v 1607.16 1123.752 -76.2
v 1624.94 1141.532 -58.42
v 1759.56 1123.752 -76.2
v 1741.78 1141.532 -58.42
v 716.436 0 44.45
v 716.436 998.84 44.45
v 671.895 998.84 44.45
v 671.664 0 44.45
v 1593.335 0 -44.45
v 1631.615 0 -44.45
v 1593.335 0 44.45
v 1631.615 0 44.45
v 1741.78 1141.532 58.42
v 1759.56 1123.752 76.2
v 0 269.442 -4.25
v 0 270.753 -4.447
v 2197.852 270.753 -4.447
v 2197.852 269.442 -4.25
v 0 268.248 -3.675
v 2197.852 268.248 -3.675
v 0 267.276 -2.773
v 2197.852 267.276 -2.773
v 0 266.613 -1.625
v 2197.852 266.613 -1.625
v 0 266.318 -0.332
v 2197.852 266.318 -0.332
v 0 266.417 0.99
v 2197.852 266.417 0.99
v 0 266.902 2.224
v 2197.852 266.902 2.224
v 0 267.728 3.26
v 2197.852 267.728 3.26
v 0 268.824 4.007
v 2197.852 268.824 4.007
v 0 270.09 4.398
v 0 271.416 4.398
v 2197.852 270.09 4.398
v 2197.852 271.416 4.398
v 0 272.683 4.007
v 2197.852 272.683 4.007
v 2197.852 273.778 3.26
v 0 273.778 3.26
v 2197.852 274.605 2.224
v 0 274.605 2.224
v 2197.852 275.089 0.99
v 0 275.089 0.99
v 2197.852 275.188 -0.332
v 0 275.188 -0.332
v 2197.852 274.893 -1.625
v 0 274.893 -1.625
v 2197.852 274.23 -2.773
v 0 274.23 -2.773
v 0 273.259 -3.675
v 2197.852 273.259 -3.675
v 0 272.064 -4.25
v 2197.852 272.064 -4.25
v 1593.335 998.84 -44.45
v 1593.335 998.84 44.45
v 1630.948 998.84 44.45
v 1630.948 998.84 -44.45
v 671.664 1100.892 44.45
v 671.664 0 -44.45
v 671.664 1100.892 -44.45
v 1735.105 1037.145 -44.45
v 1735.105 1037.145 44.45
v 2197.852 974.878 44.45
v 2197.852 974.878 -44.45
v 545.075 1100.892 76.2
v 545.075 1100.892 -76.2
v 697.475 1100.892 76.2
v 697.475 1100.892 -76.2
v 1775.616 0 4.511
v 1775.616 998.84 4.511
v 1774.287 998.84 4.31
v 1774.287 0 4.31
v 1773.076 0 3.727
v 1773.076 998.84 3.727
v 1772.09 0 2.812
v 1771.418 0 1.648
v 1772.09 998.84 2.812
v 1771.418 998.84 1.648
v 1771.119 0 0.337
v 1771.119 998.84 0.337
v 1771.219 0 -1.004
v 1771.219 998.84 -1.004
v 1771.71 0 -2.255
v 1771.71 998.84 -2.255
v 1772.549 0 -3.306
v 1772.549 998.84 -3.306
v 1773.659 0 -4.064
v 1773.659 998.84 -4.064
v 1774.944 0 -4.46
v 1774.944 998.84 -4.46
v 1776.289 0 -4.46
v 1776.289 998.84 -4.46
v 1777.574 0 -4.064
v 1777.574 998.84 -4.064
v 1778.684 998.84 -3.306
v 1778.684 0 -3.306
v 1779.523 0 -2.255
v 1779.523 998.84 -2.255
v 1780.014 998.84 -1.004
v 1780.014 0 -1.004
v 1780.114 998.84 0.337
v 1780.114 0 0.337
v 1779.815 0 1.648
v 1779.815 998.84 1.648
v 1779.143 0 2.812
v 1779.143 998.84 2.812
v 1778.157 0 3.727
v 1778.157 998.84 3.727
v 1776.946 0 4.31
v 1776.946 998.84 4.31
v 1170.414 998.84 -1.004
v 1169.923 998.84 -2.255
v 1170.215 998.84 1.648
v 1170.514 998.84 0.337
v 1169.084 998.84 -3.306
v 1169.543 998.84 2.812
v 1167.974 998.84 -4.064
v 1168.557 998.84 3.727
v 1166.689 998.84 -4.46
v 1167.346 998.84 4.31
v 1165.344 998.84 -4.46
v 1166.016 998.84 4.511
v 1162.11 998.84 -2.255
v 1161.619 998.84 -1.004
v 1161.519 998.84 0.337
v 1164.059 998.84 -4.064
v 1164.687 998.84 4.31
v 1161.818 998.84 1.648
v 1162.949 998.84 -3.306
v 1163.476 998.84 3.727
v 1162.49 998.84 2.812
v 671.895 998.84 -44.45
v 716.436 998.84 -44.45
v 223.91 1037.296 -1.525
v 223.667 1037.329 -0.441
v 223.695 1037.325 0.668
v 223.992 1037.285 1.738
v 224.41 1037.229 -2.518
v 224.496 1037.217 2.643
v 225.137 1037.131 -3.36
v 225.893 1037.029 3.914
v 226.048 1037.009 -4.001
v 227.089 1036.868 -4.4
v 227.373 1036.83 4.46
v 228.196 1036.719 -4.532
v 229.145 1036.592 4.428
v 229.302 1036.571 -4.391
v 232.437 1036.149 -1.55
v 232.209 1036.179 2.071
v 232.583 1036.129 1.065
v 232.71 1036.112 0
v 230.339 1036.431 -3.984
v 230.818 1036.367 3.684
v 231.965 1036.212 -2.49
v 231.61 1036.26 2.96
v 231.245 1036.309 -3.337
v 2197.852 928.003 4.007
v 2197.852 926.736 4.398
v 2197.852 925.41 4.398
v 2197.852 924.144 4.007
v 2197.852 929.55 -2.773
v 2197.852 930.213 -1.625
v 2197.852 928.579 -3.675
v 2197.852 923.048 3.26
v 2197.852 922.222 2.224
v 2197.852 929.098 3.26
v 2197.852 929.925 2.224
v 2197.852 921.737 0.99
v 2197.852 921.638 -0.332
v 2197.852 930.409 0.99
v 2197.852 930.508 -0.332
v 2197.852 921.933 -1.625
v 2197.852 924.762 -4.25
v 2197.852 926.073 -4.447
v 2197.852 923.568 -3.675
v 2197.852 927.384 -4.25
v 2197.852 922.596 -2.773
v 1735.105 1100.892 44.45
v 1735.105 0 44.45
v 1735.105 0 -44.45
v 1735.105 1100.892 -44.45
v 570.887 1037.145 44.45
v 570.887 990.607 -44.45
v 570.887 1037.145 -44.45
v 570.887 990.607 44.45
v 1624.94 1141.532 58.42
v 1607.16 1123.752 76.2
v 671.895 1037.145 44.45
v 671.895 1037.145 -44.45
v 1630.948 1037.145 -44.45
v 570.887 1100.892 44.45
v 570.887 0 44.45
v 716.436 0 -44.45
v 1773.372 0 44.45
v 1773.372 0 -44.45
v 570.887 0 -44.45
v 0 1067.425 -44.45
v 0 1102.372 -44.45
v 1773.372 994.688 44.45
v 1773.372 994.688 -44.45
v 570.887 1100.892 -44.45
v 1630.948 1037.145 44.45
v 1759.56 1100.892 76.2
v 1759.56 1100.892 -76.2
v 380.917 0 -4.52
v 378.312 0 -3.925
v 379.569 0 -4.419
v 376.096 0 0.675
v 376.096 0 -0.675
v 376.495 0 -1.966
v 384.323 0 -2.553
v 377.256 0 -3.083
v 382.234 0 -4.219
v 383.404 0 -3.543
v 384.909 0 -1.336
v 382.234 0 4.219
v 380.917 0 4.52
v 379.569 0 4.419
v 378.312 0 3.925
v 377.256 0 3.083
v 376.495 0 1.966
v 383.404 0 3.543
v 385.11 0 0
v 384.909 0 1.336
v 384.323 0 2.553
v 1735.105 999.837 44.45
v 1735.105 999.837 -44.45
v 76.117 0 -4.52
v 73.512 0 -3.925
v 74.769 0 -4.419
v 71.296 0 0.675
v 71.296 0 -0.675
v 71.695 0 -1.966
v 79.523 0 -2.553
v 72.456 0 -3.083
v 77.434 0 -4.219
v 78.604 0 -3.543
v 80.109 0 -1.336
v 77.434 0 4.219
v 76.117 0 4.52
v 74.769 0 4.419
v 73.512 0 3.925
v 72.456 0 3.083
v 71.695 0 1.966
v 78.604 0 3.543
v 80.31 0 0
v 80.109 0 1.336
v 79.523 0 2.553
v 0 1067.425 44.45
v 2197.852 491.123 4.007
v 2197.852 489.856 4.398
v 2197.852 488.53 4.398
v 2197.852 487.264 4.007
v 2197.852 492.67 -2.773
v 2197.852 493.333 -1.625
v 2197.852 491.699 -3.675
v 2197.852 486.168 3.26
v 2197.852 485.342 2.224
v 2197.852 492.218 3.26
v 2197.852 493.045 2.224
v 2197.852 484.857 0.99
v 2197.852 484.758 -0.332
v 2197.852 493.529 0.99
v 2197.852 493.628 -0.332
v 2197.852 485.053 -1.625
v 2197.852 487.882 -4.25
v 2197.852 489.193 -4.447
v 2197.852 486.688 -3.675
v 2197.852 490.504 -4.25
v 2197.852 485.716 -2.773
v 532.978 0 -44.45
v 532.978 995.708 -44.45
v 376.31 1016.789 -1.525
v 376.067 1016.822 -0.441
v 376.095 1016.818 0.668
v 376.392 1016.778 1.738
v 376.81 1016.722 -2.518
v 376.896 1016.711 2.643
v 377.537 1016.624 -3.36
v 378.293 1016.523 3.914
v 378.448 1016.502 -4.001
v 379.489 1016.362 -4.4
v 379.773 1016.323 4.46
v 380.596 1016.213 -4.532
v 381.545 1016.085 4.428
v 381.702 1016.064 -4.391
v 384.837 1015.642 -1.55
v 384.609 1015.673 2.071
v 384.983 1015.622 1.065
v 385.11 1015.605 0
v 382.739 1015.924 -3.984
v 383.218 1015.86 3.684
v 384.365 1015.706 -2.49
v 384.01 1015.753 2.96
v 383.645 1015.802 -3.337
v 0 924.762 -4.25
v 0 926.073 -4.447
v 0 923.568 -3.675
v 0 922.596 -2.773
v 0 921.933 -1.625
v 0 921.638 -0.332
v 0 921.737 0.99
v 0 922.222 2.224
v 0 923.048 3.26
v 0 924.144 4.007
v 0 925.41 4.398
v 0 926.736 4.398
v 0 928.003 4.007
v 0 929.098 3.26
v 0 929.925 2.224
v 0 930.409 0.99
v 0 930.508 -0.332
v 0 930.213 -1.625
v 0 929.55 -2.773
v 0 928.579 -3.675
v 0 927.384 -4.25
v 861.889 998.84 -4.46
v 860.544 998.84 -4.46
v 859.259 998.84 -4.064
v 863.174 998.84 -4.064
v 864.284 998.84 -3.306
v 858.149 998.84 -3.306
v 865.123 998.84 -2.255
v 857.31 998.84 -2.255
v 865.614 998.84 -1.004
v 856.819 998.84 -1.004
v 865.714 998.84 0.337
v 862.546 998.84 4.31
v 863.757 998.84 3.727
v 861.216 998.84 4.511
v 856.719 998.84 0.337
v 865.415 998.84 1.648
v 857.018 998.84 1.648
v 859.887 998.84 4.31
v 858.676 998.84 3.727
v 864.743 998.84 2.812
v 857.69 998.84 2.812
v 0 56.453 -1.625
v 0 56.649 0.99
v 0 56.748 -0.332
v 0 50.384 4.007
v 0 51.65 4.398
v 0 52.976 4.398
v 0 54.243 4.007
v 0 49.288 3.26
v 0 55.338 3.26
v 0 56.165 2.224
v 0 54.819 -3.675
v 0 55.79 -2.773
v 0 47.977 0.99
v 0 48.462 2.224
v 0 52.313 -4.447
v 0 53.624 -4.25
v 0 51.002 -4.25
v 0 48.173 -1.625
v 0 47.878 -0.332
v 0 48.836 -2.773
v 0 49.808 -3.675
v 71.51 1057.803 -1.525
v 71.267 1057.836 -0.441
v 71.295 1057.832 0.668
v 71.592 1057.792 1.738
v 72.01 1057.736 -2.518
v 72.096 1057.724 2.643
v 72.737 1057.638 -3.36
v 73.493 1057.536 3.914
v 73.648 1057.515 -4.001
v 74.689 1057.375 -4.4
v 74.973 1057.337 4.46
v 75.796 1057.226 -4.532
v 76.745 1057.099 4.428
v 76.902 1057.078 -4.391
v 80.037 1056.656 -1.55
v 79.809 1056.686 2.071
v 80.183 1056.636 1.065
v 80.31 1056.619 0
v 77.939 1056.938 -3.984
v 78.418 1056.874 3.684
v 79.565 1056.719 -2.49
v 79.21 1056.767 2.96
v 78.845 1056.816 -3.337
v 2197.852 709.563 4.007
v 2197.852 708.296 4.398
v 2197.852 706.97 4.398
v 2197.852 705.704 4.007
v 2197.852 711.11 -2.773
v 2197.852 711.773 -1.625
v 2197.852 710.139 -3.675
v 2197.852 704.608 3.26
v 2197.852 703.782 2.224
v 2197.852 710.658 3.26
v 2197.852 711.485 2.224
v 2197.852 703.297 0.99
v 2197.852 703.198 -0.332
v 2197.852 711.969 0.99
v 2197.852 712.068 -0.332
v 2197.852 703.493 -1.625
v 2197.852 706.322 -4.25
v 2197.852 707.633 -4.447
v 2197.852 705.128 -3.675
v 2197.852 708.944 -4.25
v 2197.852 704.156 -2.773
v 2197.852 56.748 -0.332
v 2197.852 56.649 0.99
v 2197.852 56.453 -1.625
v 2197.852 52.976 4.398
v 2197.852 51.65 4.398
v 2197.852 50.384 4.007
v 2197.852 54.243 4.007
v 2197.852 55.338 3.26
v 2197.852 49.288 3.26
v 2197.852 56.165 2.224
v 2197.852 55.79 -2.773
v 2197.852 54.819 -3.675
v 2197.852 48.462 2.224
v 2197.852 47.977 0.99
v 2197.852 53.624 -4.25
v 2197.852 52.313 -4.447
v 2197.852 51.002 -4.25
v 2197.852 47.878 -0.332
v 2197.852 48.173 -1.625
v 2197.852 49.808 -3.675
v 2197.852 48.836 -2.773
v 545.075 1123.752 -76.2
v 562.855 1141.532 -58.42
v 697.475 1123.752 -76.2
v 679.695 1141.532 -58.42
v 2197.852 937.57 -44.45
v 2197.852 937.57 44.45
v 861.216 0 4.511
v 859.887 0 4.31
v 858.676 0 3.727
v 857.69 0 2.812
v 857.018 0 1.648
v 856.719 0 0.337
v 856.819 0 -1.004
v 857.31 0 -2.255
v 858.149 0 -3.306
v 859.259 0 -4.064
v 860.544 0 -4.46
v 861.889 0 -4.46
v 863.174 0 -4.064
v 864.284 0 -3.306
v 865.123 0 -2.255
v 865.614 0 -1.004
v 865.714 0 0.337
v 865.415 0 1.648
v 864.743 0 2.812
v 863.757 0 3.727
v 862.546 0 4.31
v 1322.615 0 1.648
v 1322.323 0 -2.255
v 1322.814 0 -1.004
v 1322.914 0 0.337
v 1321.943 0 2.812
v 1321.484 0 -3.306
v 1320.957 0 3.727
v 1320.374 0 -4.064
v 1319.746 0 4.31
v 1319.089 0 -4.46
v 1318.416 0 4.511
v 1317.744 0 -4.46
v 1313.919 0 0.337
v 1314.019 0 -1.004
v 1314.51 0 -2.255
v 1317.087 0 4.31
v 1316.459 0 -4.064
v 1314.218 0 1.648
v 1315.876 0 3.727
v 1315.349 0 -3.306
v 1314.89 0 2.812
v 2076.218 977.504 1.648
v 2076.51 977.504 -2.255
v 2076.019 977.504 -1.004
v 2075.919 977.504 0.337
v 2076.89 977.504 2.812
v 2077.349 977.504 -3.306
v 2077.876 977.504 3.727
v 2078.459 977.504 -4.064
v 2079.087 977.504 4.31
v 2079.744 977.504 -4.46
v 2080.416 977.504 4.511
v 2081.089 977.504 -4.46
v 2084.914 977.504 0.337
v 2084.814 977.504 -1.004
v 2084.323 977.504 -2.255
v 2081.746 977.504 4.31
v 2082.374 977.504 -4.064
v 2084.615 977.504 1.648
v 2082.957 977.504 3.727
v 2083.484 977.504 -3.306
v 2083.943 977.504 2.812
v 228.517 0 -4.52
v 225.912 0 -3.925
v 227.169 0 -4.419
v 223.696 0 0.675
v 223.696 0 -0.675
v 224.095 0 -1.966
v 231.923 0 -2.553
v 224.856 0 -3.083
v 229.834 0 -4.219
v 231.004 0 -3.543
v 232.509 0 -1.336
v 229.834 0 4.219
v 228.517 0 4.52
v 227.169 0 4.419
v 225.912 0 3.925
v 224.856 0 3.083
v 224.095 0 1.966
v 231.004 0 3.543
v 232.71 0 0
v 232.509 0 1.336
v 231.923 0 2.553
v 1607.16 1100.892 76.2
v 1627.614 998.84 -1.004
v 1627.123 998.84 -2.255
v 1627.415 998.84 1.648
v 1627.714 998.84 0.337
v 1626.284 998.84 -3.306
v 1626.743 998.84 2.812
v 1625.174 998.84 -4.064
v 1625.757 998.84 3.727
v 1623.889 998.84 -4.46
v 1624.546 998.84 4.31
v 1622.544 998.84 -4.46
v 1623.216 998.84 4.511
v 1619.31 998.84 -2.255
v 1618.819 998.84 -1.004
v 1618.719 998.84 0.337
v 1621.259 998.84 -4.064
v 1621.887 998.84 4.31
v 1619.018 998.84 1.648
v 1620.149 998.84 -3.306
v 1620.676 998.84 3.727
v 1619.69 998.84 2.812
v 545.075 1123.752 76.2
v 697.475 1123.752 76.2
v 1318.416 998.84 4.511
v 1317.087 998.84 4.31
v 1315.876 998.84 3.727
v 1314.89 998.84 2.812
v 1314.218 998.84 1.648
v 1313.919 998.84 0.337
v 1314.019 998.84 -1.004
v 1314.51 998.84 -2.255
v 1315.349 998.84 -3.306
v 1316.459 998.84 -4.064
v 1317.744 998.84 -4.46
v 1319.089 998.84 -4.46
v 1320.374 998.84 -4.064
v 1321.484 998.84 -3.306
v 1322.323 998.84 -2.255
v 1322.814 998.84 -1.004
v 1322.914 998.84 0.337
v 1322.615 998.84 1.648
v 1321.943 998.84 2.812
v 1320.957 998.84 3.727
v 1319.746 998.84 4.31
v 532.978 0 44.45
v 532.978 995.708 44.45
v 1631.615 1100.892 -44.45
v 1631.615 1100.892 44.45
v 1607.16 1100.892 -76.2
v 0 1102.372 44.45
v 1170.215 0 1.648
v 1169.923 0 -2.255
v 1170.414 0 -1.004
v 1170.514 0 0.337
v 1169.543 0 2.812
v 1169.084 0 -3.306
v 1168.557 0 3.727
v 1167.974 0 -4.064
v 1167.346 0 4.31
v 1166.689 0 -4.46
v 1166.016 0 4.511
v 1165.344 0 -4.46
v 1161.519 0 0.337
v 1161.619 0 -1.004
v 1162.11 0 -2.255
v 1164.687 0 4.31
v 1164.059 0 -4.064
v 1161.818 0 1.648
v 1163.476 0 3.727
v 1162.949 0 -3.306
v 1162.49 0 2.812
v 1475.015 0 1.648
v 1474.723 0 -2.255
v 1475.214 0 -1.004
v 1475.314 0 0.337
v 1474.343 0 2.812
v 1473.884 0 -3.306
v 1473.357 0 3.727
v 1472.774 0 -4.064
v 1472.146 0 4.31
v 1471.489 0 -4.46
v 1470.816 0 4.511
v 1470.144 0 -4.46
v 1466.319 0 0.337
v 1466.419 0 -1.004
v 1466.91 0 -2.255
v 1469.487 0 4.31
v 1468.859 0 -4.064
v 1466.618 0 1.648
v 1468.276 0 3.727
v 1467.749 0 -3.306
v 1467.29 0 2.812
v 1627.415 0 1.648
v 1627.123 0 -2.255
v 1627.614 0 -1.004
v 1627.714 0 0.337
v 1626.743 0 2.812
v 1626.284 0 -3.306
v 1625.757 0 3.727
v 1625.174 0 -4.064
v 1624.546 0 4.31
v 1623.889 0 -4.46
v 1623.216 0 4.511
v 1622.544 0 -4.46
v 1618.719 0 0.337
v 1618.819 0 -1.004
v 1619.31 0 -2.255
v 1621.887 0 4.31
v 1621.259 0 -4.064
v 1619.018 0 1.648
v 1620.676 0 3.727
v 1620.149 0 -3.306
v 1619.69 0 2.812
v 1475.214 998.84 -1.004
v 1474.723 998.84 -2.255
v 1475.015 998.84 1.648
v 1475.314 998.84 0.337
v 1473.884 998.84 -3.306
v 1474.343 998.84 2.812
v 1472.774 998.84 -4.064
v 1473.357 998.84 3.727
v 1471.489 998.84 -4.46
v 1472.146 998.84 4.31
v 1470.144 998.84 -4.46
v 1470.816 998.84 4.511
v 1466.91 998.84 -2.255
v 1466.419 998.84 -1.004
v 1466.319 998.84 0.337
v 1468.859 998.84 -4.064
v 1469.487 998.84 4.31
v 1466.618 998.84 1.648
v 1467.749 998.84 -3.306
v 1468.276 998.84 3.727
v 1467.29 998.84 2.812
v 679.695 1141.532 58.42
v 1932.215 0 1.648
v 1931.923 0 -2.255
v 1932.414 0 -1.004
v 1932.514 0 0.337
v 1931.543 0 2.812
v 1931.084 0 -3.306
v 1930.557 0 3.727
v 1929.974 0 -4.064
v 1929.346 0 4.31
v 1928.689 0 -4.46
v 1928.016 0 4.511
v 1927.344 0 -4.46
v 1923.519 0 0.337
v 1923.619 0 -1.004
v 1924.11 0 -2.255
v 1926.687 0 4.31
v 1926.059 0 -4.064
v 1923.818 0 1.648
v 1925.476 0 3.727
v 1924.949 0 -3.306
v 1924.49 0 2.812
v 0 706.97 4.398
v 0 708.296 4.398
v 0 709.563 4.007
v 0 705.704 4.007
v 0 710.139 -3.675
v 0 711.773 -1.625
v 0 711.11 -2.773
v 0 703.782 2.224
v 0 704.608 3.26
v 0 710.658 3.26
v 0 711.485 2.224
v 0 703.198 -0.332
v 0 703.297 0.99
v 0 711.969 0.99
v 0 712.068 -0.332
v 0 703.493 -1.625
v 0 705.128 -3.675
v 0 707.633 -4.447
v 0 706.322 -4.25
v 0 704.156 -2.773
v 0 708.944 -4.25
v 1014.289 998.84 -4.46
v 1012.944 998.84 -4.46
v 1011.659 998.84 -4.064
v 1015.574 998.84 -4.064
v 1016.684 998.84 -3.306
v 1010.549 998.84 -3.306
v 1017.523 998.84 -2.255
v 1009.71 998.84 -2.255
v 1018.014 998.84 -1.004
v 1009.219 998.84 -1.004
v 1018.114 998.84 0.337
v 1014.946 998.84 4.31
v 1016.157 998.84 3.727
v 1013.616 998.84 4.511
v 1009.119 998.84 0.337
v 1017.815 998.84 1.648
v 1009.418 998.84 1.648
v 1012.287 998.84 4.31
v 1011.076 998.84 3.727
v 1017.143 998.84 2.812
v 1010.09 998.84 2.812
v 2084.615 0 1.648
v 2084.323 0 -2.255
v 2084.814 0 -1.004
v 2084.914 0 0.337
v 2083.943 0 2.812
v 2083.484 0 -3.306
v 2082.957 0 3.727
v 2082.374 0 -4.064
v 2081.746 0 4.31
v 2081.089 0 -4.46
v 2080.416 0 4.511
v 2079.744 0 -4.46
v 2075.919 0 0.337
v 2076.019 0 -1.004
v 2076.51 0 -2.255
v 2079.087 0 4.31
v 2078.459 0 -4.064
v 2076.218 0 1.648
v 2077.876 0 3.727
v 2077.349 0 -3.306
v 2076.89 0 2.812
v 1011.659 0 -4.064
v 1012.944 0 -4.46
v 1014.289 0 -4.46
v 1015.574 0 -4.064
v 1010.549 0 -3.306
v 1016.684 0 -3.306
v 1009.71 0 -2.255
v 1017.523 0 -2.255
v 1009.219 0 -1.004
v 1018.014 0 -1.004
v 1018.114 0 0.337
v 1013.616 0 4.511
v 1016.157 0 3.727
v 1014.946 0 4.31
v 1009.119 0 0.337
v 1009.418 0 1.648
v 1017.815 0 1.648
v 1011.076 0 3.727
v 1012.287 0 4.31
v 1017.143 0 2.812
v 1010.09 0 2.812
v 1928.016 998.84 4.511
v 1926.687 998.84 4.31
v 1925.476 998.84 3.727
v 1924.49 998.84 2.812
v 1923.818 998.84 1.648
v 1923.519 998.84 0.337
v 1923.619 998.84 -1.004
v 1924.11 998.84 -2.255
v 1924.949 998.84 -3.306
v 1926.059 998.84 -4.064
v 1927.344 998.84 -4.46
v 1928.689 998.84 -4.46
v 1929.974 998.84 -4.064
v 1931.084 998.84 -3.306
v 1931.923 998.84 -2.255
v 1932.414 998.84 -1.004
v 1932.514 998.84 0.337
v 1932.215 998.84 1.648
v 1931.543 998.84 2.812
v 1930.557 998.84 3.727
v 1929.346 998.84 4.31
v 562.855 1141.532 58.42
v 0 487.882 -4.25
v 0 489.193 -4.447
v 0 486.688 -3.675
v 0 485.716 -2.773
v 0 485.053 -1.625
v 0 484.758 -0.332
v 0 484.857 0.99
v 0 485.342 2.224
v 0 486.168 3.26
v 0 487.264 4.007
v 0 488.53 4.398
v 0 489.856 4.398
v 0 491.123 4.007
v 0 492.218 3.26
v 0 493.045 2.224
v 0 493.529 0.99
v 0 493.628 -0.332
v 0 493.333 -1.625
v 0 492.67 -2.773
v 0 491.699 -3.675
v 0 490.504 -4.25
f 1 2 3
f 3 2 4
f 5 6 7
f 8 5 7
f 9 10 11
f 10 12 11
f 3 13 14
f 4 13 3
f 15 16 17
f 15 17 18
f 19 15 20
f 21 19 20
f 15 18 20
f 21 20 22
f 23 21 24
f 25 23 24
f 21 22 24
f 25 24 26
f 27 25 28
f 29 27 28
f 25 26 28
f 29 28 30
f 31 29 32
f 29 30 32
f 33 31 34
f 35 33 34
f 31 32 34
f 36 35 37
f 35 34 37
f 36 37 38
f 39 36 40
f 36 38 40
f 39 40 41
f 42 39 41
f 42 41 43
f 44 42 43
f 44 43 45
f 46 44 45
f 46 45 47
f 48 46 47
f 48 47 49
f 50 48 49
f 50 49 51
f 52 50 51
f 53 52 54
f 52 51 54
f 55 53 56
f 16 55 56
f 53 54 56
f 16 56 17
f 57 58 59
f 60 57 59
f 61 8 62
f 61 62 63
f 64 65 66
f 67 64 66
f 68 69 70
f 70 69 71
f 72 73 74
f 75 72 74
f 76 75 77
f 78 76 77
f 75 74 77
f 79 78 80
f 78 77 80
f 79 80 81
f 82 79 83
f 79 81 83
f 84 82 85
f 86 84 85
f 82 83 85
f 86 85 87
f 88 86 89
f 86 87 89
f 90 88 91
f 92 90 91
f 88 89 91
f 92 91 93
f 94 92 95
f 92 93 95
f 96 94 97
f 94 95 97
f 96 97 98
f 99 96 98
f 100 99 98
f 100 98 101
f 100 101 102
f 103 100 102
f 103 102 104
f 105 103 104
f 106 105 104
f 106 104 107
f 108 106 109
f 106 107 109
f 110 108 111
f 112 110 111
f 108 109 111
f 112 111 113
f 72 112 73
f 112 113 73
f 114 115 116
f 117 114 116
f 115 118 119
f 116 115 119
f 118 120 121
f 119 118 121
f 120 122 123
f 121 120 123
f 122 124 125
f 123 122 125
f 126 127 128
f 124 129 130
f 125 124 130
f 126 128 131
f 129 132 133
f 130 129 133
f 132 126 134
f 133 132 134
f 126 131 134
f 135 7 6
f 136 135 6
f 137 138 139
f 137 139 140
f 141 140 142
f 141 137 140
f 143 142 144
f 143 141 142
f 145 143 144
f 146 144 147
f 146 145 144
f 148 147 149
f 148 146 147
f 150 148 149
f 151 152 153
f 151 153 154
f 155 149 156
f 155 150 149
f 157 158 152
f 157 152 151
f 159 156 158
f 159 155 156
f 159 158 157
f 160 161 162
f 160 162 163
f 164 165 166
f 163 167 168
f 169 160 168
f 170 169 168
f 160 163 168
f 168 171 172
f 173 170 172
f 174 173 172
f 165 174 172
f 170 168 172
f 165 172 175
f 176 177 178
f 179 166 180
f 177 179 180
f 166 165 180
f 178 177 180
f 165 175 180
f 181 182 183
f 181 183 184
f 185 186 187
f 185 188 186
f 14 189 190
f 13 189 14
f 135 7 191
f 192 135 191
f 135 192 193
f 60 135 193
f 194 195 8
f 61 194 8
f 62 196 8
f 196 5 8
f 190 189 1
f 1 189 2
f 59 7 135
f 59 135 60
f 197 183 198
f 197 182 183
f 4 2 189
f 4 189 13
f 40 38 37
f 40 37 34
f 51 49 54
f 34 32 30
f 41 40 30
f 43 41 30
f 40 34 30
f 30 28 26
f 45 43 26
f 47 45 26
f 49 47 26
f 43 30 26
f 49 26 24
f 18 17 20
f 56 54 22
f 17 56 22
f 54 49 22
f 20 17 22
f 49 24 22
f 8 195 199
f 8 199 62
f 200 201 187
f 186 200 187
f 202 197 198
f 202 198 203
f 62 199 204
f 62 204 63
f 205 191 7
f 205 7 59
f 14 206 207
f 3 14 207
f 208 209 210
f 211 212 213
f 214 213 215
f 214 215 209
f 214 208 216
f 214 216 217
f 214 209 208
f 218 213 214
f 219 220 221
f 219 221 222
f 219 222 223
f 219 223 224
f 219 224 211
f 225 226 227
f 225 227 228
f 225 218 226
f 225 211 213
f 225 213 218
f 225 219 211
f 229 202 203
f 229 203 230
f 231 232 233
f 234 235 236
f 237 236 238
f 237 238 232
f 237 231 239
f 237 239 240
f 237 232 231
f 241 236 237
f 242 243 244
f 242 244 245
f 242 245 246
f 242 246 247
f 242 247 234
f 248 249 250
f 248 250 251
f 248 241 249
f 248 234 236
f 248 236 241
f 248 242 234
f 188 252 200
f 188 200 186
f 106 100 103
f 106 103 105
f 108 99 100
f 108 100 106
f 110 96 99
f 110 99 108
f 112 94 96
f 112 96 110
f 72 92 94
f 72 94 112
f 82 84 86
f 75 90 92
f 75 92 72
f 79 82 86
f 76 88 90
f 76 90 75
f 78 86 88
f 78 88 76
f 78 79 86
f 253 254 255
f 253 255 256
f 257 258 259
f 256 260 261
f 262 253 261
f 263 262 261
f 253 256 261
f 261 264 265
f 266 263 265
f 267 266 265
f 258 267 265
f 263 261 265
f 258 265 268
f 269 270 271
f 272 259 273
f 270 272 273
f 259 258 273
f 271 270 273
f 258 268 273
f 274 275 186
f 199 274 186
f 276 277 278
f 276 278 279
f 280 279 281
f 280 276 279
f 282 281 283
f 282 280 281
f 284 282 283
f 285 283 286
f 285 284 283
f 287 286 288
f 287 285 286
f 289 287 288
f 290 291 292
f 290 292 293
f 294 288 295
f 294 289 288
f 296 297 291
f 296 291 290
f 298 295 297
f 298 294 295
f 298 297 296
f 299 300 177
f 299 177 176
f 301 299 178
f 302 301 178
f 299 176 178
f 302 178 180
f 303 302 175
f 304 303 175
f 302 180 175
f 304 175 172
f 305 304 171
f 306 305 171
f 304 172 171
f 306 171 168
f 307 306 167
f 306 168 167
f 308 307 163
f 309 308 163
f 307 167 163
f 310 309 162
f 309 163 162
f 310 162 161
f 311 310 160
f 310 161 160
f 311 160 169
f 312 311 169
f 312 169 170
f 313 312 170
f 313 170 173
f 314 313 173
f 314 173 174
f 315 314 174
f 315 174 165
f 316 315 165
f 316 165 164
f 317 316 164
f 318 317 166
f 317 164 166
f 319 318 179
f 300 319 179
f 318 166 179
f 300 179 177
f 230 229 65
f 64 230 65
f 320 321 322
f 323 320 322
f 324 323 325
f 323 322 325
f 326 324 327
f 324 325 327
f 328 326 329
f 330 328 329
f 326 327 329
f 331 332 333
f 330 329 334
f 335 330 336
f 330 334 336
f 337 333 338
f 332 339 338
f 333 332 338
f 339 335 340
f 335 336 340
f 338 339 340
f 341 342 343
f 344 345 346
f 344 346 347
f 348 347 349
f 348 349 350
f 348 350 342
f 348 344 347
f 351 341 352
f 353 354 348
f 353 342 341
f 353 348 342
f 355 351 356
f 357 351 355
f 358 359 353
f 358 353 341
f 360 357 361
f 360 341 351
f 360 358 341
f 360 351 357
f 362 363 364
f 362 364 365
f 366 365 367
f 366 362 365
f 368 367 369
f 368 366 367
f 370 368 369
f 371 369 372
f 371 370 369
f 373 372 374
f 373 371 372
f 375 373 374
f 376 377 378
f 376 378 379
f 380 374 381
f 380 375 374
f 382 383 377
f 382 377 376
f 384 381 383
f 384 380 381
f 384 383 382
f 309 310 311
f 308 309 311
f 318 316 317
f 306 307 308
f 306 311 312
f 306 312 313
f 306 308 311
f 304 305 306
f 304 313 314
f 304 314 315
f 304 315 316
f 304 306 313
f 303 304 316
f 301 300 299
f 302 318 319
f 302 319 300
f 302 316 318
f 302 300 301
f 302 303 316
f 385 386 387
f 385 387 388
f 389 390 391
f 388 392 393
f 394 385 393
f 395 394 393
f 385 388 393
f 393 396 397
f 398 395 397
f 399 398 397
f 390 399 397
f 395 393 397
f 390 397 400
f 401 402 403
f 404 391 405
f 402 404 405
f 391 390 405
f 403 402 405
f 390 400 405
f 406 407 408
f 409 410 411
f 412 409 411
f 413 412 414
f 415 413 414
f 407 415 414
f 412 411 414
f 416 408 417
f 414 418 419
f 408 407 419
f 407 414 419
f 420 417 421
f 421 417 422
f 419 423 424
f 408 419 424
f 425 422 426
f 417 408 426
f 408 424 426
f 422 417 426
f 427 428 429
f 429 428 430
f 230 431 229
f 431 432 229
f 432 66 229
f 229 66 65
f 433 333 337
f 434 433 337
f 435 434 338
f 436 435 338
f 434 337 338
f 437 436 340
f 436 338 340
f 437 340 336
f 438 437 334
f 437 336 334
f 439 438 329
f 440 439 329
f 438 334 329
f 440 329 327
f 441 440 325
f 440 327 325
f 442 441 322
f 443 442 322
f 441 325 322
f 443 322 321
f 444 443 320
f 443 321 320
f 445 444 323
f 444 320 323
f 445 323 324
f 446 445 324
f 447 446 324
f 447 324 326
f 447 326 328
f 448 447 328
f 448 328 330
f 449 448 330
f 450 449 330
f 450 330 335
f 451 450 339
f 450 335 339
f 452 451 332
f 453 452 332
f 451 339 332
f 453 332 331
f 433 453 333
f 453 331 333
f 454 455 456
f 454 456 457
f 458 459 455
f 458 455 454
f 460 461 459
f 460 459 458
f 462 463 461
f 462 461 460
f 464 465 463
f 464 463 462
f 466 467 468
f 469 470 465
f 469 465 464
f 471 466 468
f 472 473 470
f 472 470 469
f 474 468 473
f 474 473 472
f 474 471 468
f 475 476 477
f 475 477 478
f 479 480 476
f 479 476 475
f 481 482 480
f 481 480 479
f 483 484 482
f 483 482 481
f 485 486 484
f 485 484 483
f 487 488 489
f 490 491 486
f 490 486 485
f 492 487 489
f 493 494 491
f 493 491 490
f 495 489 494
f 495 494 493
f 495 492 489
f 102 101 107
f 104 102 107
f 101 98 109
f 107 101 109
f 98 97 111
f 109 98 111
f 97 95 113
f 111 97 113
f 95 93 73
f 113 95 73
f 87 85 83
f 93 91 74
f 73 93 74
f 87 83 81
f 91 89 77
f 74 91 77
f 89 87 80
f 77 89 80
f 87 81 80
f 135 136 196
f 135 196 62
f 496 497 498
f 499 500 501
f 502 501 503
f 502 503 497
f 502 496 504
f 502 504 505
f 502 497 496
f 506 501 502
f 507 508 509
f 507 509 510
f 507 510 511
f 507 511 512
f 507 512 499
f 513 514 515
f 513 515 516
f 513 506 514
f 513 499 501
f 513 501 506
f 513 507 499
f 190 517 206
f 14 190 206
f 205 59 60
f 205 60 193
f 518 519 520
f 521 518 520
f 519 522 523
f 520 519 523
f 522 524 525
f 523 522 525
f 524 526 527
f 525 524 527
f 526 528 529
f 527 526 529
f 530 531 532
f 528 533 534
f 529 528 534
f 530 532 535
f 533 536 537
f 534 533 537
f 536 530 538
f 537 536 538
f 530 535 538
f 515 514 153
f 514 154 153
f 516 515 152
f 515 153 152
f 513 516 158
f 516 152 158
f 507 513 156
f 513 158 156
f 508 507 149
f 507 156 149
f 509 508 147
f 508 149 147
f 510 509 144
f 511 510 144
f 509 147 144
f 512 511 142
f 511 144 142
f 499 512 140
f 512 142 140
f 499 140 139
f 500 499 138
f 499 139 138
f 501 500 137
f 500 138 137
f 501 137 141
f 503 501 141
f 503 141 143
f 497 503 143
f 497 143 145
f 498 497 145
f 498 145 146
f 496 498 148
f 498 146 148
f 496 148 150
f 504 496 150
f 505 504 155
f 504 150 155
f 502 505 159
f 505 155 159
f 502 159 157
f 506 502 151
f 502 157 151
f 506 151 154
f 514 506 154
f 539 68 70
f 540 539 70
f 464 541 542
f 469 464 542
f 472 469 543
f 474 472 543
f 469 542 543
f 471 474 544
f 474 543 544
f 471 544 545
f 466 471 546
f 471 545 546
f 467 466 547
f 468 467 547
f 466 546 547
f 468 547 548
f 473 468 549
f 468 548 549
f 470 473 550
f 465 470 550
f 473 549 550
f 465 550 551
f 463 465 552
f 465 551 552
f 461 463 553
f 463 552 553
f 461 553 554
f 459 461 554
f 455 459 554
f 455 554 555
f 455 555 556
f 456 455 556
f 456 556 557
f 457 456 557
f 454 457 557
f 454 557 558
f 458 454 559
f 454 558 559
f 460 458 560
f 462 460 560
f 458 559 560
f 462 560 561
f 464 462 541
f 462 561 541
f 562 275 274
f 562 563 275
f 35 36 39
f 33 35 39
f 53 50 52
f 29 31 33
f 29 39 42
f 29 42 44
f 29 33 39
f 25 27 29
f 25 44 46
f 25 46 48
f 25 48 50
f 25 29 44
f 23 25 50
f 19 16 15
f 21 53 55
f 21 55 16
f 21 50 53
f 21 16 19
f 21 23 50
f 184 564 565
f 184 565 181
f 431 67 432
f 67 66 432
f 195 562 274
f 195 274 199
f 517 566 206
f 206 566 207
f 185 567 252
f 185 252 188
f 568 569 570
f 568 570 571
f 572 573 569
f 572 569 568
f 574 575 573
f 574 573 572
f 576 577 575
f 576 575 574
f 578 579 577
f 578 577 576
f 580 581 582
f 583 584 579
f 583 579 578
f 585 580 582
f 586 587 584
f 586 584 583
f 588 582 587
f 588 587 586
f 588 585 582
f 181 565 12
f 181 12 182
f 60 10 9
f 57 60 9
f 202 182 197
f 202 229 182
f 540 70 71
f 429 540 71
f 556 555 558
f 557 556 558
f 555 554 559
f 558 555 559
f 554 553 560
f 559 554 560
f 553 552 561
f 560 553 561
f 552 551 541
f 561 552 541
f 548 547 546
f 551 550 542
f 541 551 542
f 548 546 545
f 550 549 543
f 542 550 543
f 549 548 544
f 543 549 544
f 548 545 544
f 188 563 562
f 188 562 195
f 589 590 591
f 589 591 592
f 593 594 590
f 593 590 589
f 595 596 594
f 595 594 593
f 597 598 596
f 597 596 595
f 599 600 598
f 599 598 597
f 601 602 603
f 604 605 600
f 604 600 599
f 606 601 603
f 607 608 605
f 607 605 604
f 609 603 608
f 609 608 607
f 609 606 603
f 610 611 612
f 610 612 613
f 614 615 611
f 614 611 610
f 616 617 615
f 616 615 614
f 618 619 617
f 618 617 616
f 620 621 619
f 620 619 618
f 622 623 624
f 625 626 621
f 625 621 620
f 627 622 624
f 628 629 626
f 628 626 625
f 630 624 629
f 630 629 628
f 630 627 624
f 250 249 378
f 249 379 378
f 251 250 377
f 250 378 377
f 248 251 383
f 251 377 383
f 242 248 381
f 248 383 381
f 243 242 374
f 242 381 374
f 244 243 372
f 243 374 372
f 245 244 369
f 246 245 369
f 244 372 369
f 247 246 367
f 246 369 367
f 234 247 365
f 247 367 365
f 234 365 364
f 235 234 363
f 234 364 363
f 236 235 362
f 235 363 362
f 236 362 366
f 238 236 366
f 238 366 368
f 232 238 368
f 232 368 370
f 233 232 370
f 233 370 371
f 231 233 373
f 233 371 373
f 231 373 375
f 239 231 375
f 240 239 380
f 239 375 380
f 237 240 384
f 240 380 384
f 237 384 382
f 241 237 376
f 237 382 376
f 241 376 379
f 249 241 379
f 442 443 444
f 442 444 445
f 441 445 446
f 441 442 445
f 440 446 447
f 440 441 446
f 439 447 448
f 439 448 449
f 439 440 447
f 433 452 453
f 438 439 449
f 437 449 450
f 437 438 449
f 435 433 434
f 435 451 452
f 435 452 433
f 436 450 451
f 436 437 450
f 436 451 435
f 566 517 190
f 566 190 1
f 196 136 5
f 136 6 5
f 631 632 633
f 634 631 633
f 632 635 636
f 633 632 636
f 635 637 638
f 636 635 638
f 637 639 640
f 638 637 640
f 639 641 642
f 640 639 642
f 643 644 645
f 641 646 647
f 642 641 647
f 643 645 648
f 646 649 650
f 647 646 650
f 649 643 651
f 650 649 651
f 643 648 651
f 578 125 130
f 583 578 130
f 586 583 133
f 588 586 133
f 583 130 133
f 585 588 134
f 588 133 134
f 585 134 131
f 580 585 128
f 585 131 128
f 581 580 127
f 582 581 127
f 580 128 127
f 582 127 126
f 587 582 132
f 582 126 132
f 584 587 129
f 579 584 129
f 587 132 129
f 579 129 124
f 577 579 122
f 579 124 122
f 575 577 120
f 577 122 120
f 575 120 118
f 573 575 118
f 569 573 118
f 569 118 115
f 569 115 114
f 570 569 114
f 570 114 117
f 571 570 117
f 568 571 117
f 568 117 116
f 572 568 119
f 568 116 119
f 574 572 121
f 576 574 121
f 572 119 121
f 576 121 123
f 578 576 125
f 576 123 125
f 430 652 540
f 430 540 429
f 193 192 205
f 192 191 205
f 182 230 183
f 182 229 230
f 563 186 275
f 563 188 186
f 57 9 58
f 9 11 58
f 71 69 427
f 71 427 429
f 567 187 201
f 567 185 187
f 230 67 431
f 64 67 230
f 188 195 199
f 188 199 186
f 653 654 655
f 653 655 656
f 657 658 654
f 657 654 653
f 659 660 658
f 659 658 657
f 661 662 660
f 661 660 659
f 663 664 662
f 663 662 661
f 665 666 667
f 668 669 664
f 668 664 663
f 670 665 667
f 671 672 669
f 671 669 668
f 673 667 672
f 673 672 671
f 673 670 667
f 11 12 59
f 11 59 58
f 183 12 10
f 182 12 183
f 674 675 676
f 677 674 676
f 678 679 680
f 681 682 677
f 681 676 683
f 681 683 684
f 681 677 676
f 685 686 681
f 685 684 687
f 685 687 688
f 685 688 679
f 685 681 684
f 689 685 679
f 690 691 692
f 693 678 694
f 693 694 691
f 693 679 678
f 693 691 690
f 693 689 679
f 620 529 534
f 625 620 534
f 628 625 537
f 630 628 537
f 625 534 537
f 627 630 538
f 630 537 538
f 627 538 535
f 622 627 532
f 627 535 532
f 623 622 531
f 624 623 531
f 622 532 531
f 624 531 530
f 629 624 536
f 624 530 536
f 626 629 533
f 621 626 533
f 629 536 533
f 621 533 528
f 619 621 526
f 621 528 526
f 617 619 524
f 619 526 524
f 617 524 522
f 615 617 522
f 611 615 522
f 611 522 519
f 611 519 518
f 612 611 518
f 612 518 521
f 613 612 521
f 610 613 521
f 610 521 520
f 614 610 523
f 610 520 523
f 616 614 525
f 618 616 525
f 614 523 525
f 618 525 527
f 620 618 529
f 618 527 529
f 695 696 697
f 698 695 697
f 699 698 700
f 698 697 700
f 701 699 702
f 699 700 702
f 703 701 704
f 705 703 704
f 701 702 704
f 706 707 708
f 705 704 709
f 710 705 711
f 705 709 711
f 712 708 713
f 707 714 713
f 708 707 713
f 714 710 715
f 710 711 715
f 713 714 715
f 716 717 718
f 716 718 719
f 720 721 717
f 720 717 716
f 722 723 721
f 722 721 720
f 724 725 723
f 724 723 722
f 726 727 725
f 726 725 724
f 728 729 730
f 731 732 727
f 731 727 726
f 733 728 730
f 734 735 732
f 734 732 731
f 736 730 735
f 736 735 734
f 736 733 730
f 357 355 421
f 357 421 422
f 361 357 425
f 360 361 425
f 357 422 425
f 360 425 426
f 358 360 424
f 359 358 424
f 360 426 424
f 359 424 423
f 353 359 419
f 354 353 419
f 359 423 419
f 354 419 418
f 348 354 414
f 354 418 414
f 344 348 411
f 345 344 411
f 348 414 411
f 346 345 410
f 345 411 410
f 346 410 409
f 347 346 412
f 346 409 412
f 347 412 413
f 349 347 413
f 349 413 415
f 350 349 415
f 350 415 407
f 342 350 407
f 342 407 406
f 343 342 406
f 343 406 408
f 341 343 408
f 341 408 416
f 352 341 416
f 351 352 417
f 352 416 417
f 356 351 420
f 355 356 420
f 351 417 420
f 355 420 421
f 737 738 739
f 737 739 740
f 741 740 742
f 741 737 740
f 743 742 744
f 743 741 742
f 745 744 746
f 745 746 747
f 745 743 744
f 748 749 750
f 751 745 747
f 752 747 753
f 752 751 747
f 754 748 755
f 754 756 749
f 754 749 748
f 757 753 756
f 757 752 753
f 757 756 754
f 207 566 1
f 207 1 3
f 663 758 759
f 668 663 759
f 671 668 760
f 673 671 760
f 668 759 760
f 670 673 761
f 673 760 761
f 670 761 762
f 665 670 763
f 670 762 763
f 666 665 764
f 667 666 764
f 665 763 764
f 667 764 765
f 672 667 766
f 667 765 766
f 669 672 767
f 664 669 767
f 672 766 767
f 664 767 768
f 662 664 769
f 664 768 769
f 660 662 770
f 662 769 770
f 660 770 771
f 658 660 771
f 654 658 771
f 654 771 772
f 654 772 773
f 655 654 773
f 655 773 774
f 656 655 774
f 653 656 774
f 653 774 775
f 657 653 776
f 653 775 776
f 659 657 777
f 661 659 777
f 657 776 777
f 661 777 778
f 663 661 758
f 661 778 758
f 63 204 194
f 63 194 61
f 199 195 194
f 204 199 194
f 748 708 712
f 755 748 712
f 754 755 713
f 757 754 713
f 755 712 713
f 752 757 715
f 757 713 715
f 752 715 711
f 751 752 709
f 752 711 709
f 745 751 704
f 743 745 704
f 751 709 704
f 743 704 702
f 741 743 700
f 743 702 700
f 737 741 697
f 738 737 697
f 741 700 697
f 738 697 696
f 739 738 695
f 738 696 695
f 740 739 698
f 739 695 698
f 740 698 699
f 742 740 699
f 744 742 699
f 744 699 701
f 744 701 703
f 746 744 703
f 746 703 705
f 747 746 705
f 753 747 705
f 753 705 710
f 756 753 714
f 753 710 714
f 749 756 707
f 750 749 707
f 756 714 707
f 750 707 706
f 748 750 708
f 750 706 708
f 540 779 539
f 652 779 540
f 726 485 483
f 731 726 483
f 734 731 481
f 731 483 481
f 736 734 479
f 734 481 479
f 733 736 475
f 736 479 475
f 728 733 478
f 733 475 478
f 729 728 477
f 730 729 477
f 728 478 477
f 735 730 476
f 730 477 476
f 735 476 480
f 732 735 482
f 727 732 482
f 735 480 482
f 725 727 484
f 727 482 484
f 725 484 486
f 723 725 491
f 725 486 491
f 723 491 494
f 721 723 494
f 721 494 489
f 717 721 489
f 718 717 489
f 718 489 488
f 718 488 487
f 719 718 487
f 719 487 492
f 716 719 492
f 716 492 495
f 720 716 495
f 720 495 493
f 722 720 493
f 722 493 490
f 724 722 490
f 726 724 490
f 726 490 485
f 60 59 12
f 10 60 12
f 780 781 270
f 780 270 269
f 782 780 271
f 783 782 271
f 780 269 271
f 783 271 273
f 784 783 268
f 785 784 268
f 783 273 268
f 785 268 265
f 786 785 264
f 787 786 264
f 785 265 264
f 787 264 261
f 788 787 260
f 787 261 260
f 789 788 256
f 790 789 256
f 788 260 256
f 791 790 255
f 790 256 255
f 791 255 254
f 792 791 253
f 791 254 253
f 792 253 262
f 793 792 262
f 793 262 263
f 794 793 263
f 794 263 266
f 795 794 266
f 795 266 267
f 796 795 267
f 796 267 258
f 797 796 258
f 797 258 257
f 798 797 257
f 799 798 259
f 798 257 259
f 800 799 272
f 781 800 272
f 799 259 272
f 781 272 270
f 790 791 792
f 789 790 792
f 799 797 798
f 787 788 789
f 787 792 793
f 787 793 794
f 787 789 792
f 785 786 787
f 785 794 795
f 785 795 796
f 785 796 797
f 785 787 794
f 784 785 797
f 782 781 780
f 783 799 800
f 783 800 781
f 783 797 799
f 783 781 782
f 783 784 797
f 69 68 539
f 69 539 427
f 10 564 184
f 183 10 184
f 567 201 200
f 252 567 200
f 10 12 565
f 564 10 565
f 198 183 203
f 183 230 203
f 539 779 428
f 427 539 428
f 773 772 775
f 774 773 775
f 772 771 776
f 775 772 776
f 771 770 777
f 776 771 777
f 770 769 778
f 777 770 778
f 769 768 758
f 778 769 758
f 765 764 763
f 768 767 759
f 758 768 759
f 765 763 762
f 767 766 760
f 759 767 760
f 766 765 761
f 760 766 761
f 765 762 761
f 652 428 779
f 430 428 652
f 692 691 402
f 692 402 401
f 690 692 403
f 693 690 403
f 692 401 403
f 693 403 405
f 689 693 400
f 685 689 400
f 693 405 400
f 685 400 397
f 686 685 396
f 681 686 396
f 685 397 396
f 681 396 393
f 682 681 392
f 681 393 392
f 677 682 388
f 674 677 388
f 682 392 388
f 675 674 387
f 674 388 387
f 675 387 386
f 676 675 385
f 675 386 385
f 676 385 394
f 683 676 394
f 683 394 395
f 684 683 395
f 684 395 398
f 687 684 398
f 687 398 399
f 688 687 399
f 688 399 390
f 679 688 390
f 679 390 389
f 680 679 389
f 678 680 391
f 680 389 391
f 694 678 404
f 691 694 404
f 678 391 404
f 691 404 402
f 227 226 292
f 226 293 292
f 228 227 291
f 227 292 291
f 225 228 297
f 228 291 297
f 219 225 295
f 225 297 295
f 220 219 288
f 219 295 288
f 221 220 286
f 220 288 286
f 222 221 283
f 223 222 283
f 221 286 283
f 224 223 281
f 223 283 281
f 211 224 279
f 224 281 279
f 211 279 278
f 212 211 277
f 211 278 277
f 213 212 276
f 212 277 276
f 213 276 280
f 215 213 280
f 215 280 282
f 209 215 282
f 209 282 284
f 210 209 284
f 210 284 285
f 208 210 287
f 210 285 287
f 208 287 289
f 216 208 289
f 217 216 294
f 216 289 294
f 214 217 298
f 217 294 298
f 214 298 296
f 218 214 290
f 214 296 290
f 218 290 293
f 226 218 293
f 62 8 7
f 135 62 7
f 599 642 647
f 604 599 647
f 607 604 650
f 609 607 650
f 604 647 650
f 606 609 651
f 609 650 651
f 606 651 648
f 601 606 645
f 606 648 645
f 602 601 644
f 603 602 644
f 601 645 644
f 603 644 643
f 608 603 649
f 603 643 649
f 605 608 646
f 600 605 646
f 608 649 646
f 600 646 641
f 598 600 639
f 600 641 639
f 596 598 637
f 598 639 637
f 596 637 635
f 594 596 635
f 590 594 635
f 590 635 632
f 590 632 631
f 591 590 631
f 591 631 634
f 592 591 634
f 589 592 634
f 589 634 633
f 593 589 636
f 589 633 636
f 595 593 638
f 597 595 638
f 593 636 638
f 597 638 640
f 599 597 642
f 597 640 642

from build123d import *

# Parameters (mm, degrees)
SKETCH2_W                        = 100.776454278
SKETCH2_H                        = 1172.012262384
POSTS_DEPTH                      = 44.45
SKETCH2_W_2                      = 103.490918788
POSTS_2_DEPTH                    = 44.45
TOP_2X4_DEPTH                    = 44.45
TOP_2X4_2_DEPTH                  = 44.45
SIDE_VERTICALS_DEPTH             = 44.45
SIDE_VERTICALS_2_DEPTH           = 44.45
SKETCH5_W                        = 959.05267275
SKETCH5_H                        = 38.305522828
GATE_FRAME_TOP_DEPTH             = 44.45
GATE_SIDE_VERTICALS_DEPTH        = 44.45
GATE_SIDE_VERTICALS_2_DEPTH      = 44.45
SKETCH9_R                        = 4.510522668
GATE_AND_RIGHT_VERT_WIRE_DEPTH   = 998.839638219
GATE_AND_RIGHT_VERT_WIRE_2_DEPTH = 998.839638219
GATE_AND_RIGHT_VERT_WIRE_3_DEPTH = 998.839638219
GATE_AND_RIGHT_VERT_WIRE_4_DEPTH = 998.839638219
GATE_AND_RIGHT_VERT_WIRE_5_DEPTH = 998.839638219
GATE_AND_RIGHT_VERT_WIRE_6_DEPTH = 998.839638219
GATE_AND_RIGHT_VERT_WIRE_7_DEPTH = 998.839638219
GATE_AND_RIGHT_VERT_WIRE_8_DEPTH = 998.839638219
GATE_AND_RIGHT_VERT_WIRE_9_DEPTH = 998.839638219
LEFT_VERT_WIRE_REACH             = 2416.583
SKETCH11_R                       = 4.532222792
LEFT_VERT_WIRE_DIRECTION_2_DEPTH = 998.839638
HORIZONTAL_START                 = -1664.874327
SKETCH12_R                       = 4.447444092
HORIZONTAL_WIRE_DEPTH            = 2197.852307
HORIZONTAL_WIRE_2_DEPTH          = 2197.852307
HORIZONTAL_WIRE_3_DEPTH          = 2197.852307
HORIZONTAL_WIRE_4_DEPTH          = 2197.852307
HORIZONTAL_WIRE_5_DEPTH          = 2197.852307
SKETCH13_R                       = 4.510522668
CUT_EXTRUDE1_DEPTH               = 21.336
SKETCH14_W                       = 103.490918788
SKETCH14_H                       = 88.9
SKETCH14_W_2                     = 100.776454278
CUT_EXTRUDE2_DEPTH               = 71.12
SKETCH23_W                       = 152.4
SKETCH23_H                       = 152.4
BOSS_EXTRUDE1_DEPTH              = 40.64
BOSS_EXTRUDE1_2_DEPTH            = 40.64
CHAMFER1_SIZE                    = 17.78
CHAMFER2_SIZE                    = 17.78


with BuildPart() as part:
    # Sketch2 → Posts (new, symmetric)
    with BuildSketch(Plane.XY):
        with Locations((621.27547247, 586.006131192)):
            Rectangle(SKETCH2_W, SKETCH2_H)
    extrude(amount=POSTS_DEPTH, both=True)


with BuildPart() as body_2:
    # Sketch2 → Posts 2 (new, symmetric)
    with BuildSketch(Plane.XY):
        with Locations((1683.360010639, 586.006131192)):
            Rectangle(SKETCH2_W_2, SKETCH2_H)
    extrude(amount=POSTS_2_DEPTH, both=True)


with BuildPart() as body_3:
    # Sketch3 → Top 2x4 (new, symmetric)
    with BuildSketch(Plane.XY):
        Polygon((570.887245331, 1037.145161047), (0, 1102.372368395), (0, 1067.425386357), (570.887245331, 990.607252759), align=None)
    extrude(amount=TOP_2X4_DEPTH, both=True)


with BuildPart() as body_4:
    # Sketch3 → Top 2x4 2 (new, symmetric)
    with BuildSketch(Plane.XY):
        Polygon((1735.105470033, 1037.145161047), (2197.85230682, 974.878314798), (2197.85230682, 937.569835403), (1735.105470033, 999.836681652), align=None)
    extrude(amount=TOP_2X4_2_DEPTH, both=True)


with BuildPart() as body_5:
    # Sketch4 → Side Verticals (new, symmetric)
    with BuildSketch(Plane.XY):
        Polygon((532.977980241, 995.708293314), (532.977980241, 0), (570.887245331, 0), (570.887245331, 990.607252759), align=None)
    extrude(amount=SIDE_VERTICALS_DEPTH, both=True)


with BuildPart() as body_6:
    # Sketch4 → Side Verticals 2 (new, symmetric)
    with BuildSketch(Plane.XY):
        Polygon((1735.105470033, 0), (1773.372461411, 0), (1773.372461411, 994.687505733), (1735.105470033, 999.836681652), align=None)
    extrude(amount=SIDE_VERTICALS_2_DEPTH, both=True)


with BuildPart() as body_7:
    # Sketch5 → Gate Frame Top (new, symmetric)
    with BuildSketch(Plane.XY):
        with Locations((1151.421194056, 1017.992399633)):
            Rectangle(SKETCH5_W, SKETCH5_H)
    extrude(amount=GATE_FRAME_TOP_DEPTH, both=True)


with BuildPart() as body_8:
    # Sketch7 → Gate Side Verticals (new, symmetric)
    with BuildSketch(Plane.XY):
        Polygon((671.894857681, 998.839638219), (716.436459545, 998.839638219), (716.436459545, 0), (671.663699609, 0), align=None)
    extrude(amount=GATE_SIDE_VERTICALS_DEPTH, both=True)


with BuildPart() as body_9:
    # Sketch7 → Gate Side Verticals 2 (new, symmetric)
    with BuildSketch(Plane.XY):
        Polygon((1630.947530431, 998.839638219), (1631.614551245, 0), (1593.334739356, 0), (1593.334739356, 998.839638219), align=None)
    extrude(amount=GATE_SIDE_VERTICALS_2_DEPTH, both=True)


with BuildPart() as body_10:
    # Sketch9 → Gate and Right Vert Wire (new body)
    with BuildSketch(Plane(origin=(0, 998.839638219, 0), x_dir=(-1, 0, 0), z_dir=(0, -1, 0))):
        with Locations(Location((-861.216459545, 0, 0), (0, 0, 270))):
            Circle(SKETCH9_R)
    extrude(amount=GATE_AND_RIGHT_VERT_WIRE_DEPTH)


with BuildPart() as body_11:
    # Sketch9 → Gate and Right Vert Wire 2 (new body)
    with BuildSketch(Plane(origin=(0, 998.839638219, 0), x_dir=(-1, 0, 0), z_dir=(0, -1, 0))):
        with Locations(Location((-1013.616459545, 0, 0), (0, 0, 270))):
            Circle(SKETCH9_R)
    extrude(amount=GATE_AND_RIGHT_VERT_WIRE_2_DEPTH)


with BuildPart() as body_12:
    # Sketch9 → Gate and Right Vert Wire 3 (new body)
    with BuildSketch(Plane(origin=(0, 998.839638219, 0), x_dir=(-1, 0, 0), z_dir=(0, -1, 0))):
        with Locations(Location((-1166.016459545, 0, 0), (0, 0, 270))):
            Circle(SKETCH9_R)
    extrude(amount=GATE_AND_RIGHT_VERT_WIRE_3_DEPTH)


with BuildPart() as body_13:
    # Sketch9 → Gate and Right Vert Wire 4 (new body)
    with BuildSketch(Plane(origin=(0, 998.839638219, 0), x_dir=(-1, 0, 0), z_dir=(0, -1, 0))):
        with Locations(Location((-1318.416459545, 0, 0), (0, 0, 270))):
            Circle(SKETCH9_R)
    extrude(amount=GATE_AND_RIGHT_VERT_WIRE_4_DEPTH)


with BuildPart() as body_14:
    # Sketch9 → Gate and Right Vert Wire 5 (new body)
    with BuildSketch(Plane(origin=(0, 998.839638219, 0), x_dir=(-1, 0, 0), z_dir=(0, -1, 0))):
        with Locations(Location((-1470.816459545, 0, 0), (0, 0, 270))):
            Circle(SKETCH9_R)
    extrude(amount=GATE_AND_RIGHT_VERT_WIRE_5_DEPTH)


with BuildPart() as body_15:
    # Sketch9 → Gate and Right Vert Wire 6 (new body)
    with BuildSketch(Plane(origin=(0, 998.839638219, 0), x_dir=(-1, 0, 0), z_dir=(0, -1, 0))):
        with Locations(Location((-1623.216459545, 0, 0), (0, 0, 270))):
            Circle(SKETCH9_R)
    extrude(amount=GATE_AND_RIGHT_VERT_WIRE_6_DEPTH)


with BuildPart() as body_16:
    # Sketch9 → Gate and Right Vert Wire 7 (new body)
    with BuildSketch(Plane(origin=(0, 998.839638219, 0), x_dir=(-1, 0, 0), z_dir=(0, -1, 0))):
        with Locations(Location((-1775.616459545, 0, 0), (0, 0, 270))):
            Circle(SKETCH9_R)
    extrude(amount=GATE_AND_RIGHT_VERT_WIRE_7_DEPTH)


with BuildPart() as body_17:
    # Sketch9 → Gate and Right Vert Wire 8 (new body)
    with BuildSketch(Plane(origin=(0, 998.839638219, 0), x_dir=(-1, 0, 0), z_dir=(0, -1, 0))):
        with Locations(Location((-1928.016459545, 0, 0), (0, 0, 270))):
            Circle(SKETCH9_R)
    extrude(amount=GATE_AND_RIGHT_VERT_WIRE_8_DEPTH)


with BuildPart() as body_18:
    # Sketch9 → Gate and Right Vert Wire 9 (new body)
    with BuildSketch(Plane(origin=(0, 998.839638219, 0), x_dir=(-1, 0, 0), z_dir=(0, -1, 0))):
        with Locations(Location((-2080.416459545, 0, 0), (0, 0, 270))):
            Circle(SKETCH9_R)
    extrude(amount=GATE_AND_RIGHT_VERT_WIRE_9_DEPTH)

    # Sketch13 → Cut-Extrude1 (cut)
    with BuildSketch(Plane(origin=(0, 998.839638219, 0), x_dir=(1, 0, 0), z_dir=(0, 1, 0))):
        with Locations(Location((2080.416459545, 0, 0), (0, 0, 270))):
            Circle(SKETCH13_R)
    extrude(amount=-CUT_EXTRUDE1_DEPTH, mode=Mode.SUBTRACT)


with BuildPart() as body_19:
    # Left Vert Wire: up to this plane
    left_vert_wire_end = Plane(origin=(0, 1067.425386357, 44.45), z_dir=(0.13335732463892713, 0.9910680218658797, 0))
    # Sketch11 → Left Vert Wire (new, up to the surface)
    with BuildSketch(Plane.XZ.offset(-998.839638219), mode=Mode.PRIVATE) as left_vert_wire_sk1:
        with Locations((380.577980241, 0)):
            Circle(SKETCH11_R)
    left_vert_wire_tool1 = split(extrude(left_vert_wire_sk1.sketch, amount=-LEFT_VERT_WIRE_REACH, mode=Mode.PRIVATE), bisect_by=left_vert_wire_end, keep=Keep.BOTH, mode=Mode.PRIVATE)
    add(left_vert_wire_tool1.solids().sort_by_distance((380.57798, 998.839638, 0))[0])
    # Sketch11 → Left Vert Wire (new, up to the surface)
    with BuildSketch(Plane.XZ.offset(-998.839638219), mode=Mode.PRIVATE) as left_vert_wire_sk2:
        with Locations((228.177980241, 0)):
            Circle(SKETCH11_R)
    left_vert_wire_tool2 = split(extrude(left_vert_wire_sk2.sketch, amount=-LEFT_VERT_WIRE_REACH, mode=Mode.PRIVATE), bisect_by=left_vert_wire_end, keep=Keep.BOTH, mode=Mode.PRIVATE)
    add(left_vert_wire_tool2.solids().sort_by_distance((228.17798, 998.839638, 0))[0])
    # Sketch11 → Left Vert Wire (new, up to the surface)
    with BuildSketch(Plane.XZ.offset(-998.839638219), mode=Mode.PRIVATE) as left_vert_wire_sk3:
        with Locations((75.777980241, 0)):
            Circle(SKETCH11_R)
    left_vert_wire_tool3 = split(extrude(left_vert_wire_sk3.sketch, amount=-LEFT_VERT_WIRE_REACH, mode=Mode.PRIVATE), bisect_by=left_vert_wire_end, keep=Keep.BOTH, mode=Mode.PRIVATE)
    add(left_vert_wire_tool3.solids().sort_by_distance((75.77798, 998.839638, 0))[0])

    # Sketch11 → Left Vert Wire direction 2 (add)
    with BuildSketch(Plane.XZ.offset(-998.839638219)):
        with Locations((380.577980241, 0)):
            Circle(SKETCH11_R)
        with Locations((228.177980241, 0)):
            Circle(SKETCH11_R)
        with Locations((75.777980241, 0)):
            Circle(SKETCH11_R)
    extrude(amount=LEFT_VERT_WIRE_DIRECTION_2_DEPTH)


with BuildPart() as body_20:
    # Sketch12 → Horizontal Wire (new body)
    with BuildSketch(Plane.ZY.offset(-532.977980241).offset(HORIZONTAL_START)):
        with Locations(Location((0, 926.073219901, 0), (0, 0, 180))):
            Circle(SKETCH12_R)
    extrude(amount=HORIZONTAL_WIRE_DEPTH)


with BuildPart() as body_21:
    # Sketch12 → Horizontal Wire 2 (new body)
    with BuildSketch(Plane.ZY.offset(-532.977980241).offset(HORIZONTAL_START)):
        with Locations(Location((0, 707.633219901, 0), (0, 0, 180))):
            Circle(SKETCH12_R)
    extrude(amount=HORIZONTAL_WIRE_2_DEPTH)


with BuildPart() as body_22:
    # Sketch12 → Horizontal Wire 3 (new body)
    with BuildSketch(Plane.ZY.offset(-532.977980241).offset(HORIZONTAL_START)):
        with Locations(Location((0, 489.193219901, 0), (0, 0, 180))):
            Circle(SKETCH12_R)
    extrude(amount=HORIZONTAL_WIRE_3_DEPTH)


with BuildPart() as body_23:
    # Sketch12 → Horizontal Wire 4 (new body)
    with BuildSketch(Plane.ZY.offset(-532.977980241).offset(HORIZONTAL_START)):
        with Locations(Location((0, 270.753219901, 0), (0, 0, 180))):
            Circle(SKETCH12_R)
    extrude(amount=HORIZONTAL_WIRE_4_DEPTH)


with BuildPart() as body_24:
    # Sketch12 → Horizontal Wire 5 (new body)
    with BuildSketch(Plane.ZY.offset(-532.977980241).offset(HORIZONTAL_START)):
        with Locations(Location((0, 52.313219901, 0), (0, 0, 180))):
            Circle(SKETCH12_R)
    extrude(amount=HORIZONTAL_WIRE_5_DEPTH)


with BuildPart() as cut_extrude2_tool:
    # Sketch14 → Cut-Extrude2 (new body)
    with BuildSketch(Plane(origin=(0, 1172.012262384, 0), x_dir=(1, 0, 0), z_dir=(0, 1, 0))):
        with Locations((1683.360010639, 0)):
            Rectangle(SKETCH14_W, SKETCH14_H)
        with Locations((621.27547247, 0)):
            Rectangle(SKETCH14_W_2, SKETCH14_H)
    extrude(amount=-CUT_EXTRUDE2_DEPTH)


with BuildPart() as part_1:
    add(part.part)

    # Cut-Extrude2: cut by cut_extrude2_tool
    add(cut_extrude2_tool.part, mode=Mode.SUBTRACT)


with BuildPart() as body_2_1:
    add(body_2.part)

    # Cut-Extrude2: cut by cut_extrude2_tool
    add(cut_extrude2_tool.part, mode=Mode.SUBTRACT)


with BuildPart() as body_25:
    # Sketch23 → Boss-Extrude1 (new body)
    with BuildSketch(Plane(origin=(0, 1100.892262384, 0), x_dir=(1, 0, 0), z_dir=(0, 1, 0))):
        with Locations((1683.360010639, 0)):
            Rectangle(SKETCH23_W, SKETCH23_H)
    extrude(amount=BOSS_EXTRUDE1_DEPTH)

    # Chamfer2
    chamfer2_edges = [body_25.edges().sort_by_distance(p)[0] for p in [
        (1607.160010639, 1141.532262384, 0),
        (1683.360010639, 1141.532262384, 76.2),
        (1759.560010639, 1141.532262384, 0),
        (1683.360010639, 1141.532262384, -76.2),
    ]]
    chamfer(chamfer2_edges, length=CHAMFER2_SIZE)


with BuildPart() as body_26:
    # Sketch23 → Boss-Extrude1 2 (new body)
    with BuildSketch(Plane(origin=(0, 1100.892262384, 0), x_dir=(1, 0, 0), z_dir=(0, 1, 0))):
        with Locations((621.27547247, 0)):
            Rectangle(SKETCH23_W, SKETCH23_H)
    extrude(amount=BOSS_EXTRUDE1_2_DEPTH)

    # Chamfer1
    chamfer1_edges = [body_26.edges().sort_by_distance(p)[0] for p in [
        (545.07547247, 1141.532262384, 0),
        (621.27547247, 1141.532262384, 76.2),
        (697.47547247, 1141.532262384, 0),
        (621.27547247, 1141.532262384, -76.2),
    ]]
    chamfer(chamfer1_edges, length=CHAMFER1_SIZE)


solid = Compound([body_3.part, body_4.part, body_5.part, body_6.part, body_7.part, body_8.part, body_9.part, body_10.part, body_11.part, body_12.part, body_13.part, body_14.part, body_15.part, body_16.part, body_17.part, body_18.part, body_19.part, body_20.part, body_21.part, body_22.part, body_23.part, body_24.part, part_1.part, body_2_1.part, body_25.part, body_26.part])
